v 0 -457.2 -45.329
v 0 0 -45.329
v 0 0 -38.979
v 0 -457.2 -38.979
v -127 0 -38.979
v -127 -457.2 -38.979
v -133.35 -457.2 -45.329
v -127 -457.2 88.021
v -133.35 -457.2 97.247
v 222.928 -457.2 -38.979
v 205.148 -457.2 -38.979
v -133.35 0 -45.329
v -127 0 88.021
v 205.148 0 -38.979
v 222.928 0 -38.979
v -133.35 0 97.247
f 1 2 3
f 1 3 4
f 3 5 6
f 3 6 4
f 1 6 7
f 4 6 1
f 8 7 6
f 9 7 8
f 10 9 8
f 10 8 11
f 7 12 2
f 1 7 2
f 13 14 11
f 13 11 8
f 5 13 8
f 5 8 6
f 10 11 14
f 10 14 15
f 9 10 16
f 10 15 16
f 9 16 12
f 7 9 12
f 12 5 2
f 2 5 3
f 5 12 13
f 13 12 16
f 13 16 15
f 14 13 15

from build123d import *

# Parameters (mm, degrees)
F1_DEPTH = 457.2
F2_T     = 6.35
F3_W     = 205.1480994978
F3_H     = 457.2
F3_W_2   = 34.3874049749
F4_DEPTH = 6.35


with BuildPart() as f1:
    # F0 (on Front) → F1 (new body)
    with BuildSketch(Plane.XZ):
        Polygon((-127, 88.0205180943), (-127, -38.9794819057), (205.1480994978, -38.9794819057), align=None)
    extrude(amount=F1_DEPTH)

    # F2
    f2_openings = [f1.faces().sort_by_distance(p)[0] for p in [
        (-16.283967, -457.2, 3.353851),
        (-16.283967, 0, 3.353851),
    ]]
    offset(amount=F2_T, openings=f2_openings, kind=Kind.INTERSECTION)

    # F3 (on face) → F4 (cut)
    with BuildSketch(Plane(origin=(0, 0, -45.3294819057), x_dir=(1, 0, 0), z_dir=(0, 0, -1))):
        with Locations((102.5740497489, 228.6)):
            Rectangle(F3_W, F3_H)
        with Locations((222.3418019852, 228.6)):
            Rectangle(F3_W_2, F3_H)
    extrude(amount=-F4_DEPTH, mode=Mode.SUBTRACT)


solid = f1.part
